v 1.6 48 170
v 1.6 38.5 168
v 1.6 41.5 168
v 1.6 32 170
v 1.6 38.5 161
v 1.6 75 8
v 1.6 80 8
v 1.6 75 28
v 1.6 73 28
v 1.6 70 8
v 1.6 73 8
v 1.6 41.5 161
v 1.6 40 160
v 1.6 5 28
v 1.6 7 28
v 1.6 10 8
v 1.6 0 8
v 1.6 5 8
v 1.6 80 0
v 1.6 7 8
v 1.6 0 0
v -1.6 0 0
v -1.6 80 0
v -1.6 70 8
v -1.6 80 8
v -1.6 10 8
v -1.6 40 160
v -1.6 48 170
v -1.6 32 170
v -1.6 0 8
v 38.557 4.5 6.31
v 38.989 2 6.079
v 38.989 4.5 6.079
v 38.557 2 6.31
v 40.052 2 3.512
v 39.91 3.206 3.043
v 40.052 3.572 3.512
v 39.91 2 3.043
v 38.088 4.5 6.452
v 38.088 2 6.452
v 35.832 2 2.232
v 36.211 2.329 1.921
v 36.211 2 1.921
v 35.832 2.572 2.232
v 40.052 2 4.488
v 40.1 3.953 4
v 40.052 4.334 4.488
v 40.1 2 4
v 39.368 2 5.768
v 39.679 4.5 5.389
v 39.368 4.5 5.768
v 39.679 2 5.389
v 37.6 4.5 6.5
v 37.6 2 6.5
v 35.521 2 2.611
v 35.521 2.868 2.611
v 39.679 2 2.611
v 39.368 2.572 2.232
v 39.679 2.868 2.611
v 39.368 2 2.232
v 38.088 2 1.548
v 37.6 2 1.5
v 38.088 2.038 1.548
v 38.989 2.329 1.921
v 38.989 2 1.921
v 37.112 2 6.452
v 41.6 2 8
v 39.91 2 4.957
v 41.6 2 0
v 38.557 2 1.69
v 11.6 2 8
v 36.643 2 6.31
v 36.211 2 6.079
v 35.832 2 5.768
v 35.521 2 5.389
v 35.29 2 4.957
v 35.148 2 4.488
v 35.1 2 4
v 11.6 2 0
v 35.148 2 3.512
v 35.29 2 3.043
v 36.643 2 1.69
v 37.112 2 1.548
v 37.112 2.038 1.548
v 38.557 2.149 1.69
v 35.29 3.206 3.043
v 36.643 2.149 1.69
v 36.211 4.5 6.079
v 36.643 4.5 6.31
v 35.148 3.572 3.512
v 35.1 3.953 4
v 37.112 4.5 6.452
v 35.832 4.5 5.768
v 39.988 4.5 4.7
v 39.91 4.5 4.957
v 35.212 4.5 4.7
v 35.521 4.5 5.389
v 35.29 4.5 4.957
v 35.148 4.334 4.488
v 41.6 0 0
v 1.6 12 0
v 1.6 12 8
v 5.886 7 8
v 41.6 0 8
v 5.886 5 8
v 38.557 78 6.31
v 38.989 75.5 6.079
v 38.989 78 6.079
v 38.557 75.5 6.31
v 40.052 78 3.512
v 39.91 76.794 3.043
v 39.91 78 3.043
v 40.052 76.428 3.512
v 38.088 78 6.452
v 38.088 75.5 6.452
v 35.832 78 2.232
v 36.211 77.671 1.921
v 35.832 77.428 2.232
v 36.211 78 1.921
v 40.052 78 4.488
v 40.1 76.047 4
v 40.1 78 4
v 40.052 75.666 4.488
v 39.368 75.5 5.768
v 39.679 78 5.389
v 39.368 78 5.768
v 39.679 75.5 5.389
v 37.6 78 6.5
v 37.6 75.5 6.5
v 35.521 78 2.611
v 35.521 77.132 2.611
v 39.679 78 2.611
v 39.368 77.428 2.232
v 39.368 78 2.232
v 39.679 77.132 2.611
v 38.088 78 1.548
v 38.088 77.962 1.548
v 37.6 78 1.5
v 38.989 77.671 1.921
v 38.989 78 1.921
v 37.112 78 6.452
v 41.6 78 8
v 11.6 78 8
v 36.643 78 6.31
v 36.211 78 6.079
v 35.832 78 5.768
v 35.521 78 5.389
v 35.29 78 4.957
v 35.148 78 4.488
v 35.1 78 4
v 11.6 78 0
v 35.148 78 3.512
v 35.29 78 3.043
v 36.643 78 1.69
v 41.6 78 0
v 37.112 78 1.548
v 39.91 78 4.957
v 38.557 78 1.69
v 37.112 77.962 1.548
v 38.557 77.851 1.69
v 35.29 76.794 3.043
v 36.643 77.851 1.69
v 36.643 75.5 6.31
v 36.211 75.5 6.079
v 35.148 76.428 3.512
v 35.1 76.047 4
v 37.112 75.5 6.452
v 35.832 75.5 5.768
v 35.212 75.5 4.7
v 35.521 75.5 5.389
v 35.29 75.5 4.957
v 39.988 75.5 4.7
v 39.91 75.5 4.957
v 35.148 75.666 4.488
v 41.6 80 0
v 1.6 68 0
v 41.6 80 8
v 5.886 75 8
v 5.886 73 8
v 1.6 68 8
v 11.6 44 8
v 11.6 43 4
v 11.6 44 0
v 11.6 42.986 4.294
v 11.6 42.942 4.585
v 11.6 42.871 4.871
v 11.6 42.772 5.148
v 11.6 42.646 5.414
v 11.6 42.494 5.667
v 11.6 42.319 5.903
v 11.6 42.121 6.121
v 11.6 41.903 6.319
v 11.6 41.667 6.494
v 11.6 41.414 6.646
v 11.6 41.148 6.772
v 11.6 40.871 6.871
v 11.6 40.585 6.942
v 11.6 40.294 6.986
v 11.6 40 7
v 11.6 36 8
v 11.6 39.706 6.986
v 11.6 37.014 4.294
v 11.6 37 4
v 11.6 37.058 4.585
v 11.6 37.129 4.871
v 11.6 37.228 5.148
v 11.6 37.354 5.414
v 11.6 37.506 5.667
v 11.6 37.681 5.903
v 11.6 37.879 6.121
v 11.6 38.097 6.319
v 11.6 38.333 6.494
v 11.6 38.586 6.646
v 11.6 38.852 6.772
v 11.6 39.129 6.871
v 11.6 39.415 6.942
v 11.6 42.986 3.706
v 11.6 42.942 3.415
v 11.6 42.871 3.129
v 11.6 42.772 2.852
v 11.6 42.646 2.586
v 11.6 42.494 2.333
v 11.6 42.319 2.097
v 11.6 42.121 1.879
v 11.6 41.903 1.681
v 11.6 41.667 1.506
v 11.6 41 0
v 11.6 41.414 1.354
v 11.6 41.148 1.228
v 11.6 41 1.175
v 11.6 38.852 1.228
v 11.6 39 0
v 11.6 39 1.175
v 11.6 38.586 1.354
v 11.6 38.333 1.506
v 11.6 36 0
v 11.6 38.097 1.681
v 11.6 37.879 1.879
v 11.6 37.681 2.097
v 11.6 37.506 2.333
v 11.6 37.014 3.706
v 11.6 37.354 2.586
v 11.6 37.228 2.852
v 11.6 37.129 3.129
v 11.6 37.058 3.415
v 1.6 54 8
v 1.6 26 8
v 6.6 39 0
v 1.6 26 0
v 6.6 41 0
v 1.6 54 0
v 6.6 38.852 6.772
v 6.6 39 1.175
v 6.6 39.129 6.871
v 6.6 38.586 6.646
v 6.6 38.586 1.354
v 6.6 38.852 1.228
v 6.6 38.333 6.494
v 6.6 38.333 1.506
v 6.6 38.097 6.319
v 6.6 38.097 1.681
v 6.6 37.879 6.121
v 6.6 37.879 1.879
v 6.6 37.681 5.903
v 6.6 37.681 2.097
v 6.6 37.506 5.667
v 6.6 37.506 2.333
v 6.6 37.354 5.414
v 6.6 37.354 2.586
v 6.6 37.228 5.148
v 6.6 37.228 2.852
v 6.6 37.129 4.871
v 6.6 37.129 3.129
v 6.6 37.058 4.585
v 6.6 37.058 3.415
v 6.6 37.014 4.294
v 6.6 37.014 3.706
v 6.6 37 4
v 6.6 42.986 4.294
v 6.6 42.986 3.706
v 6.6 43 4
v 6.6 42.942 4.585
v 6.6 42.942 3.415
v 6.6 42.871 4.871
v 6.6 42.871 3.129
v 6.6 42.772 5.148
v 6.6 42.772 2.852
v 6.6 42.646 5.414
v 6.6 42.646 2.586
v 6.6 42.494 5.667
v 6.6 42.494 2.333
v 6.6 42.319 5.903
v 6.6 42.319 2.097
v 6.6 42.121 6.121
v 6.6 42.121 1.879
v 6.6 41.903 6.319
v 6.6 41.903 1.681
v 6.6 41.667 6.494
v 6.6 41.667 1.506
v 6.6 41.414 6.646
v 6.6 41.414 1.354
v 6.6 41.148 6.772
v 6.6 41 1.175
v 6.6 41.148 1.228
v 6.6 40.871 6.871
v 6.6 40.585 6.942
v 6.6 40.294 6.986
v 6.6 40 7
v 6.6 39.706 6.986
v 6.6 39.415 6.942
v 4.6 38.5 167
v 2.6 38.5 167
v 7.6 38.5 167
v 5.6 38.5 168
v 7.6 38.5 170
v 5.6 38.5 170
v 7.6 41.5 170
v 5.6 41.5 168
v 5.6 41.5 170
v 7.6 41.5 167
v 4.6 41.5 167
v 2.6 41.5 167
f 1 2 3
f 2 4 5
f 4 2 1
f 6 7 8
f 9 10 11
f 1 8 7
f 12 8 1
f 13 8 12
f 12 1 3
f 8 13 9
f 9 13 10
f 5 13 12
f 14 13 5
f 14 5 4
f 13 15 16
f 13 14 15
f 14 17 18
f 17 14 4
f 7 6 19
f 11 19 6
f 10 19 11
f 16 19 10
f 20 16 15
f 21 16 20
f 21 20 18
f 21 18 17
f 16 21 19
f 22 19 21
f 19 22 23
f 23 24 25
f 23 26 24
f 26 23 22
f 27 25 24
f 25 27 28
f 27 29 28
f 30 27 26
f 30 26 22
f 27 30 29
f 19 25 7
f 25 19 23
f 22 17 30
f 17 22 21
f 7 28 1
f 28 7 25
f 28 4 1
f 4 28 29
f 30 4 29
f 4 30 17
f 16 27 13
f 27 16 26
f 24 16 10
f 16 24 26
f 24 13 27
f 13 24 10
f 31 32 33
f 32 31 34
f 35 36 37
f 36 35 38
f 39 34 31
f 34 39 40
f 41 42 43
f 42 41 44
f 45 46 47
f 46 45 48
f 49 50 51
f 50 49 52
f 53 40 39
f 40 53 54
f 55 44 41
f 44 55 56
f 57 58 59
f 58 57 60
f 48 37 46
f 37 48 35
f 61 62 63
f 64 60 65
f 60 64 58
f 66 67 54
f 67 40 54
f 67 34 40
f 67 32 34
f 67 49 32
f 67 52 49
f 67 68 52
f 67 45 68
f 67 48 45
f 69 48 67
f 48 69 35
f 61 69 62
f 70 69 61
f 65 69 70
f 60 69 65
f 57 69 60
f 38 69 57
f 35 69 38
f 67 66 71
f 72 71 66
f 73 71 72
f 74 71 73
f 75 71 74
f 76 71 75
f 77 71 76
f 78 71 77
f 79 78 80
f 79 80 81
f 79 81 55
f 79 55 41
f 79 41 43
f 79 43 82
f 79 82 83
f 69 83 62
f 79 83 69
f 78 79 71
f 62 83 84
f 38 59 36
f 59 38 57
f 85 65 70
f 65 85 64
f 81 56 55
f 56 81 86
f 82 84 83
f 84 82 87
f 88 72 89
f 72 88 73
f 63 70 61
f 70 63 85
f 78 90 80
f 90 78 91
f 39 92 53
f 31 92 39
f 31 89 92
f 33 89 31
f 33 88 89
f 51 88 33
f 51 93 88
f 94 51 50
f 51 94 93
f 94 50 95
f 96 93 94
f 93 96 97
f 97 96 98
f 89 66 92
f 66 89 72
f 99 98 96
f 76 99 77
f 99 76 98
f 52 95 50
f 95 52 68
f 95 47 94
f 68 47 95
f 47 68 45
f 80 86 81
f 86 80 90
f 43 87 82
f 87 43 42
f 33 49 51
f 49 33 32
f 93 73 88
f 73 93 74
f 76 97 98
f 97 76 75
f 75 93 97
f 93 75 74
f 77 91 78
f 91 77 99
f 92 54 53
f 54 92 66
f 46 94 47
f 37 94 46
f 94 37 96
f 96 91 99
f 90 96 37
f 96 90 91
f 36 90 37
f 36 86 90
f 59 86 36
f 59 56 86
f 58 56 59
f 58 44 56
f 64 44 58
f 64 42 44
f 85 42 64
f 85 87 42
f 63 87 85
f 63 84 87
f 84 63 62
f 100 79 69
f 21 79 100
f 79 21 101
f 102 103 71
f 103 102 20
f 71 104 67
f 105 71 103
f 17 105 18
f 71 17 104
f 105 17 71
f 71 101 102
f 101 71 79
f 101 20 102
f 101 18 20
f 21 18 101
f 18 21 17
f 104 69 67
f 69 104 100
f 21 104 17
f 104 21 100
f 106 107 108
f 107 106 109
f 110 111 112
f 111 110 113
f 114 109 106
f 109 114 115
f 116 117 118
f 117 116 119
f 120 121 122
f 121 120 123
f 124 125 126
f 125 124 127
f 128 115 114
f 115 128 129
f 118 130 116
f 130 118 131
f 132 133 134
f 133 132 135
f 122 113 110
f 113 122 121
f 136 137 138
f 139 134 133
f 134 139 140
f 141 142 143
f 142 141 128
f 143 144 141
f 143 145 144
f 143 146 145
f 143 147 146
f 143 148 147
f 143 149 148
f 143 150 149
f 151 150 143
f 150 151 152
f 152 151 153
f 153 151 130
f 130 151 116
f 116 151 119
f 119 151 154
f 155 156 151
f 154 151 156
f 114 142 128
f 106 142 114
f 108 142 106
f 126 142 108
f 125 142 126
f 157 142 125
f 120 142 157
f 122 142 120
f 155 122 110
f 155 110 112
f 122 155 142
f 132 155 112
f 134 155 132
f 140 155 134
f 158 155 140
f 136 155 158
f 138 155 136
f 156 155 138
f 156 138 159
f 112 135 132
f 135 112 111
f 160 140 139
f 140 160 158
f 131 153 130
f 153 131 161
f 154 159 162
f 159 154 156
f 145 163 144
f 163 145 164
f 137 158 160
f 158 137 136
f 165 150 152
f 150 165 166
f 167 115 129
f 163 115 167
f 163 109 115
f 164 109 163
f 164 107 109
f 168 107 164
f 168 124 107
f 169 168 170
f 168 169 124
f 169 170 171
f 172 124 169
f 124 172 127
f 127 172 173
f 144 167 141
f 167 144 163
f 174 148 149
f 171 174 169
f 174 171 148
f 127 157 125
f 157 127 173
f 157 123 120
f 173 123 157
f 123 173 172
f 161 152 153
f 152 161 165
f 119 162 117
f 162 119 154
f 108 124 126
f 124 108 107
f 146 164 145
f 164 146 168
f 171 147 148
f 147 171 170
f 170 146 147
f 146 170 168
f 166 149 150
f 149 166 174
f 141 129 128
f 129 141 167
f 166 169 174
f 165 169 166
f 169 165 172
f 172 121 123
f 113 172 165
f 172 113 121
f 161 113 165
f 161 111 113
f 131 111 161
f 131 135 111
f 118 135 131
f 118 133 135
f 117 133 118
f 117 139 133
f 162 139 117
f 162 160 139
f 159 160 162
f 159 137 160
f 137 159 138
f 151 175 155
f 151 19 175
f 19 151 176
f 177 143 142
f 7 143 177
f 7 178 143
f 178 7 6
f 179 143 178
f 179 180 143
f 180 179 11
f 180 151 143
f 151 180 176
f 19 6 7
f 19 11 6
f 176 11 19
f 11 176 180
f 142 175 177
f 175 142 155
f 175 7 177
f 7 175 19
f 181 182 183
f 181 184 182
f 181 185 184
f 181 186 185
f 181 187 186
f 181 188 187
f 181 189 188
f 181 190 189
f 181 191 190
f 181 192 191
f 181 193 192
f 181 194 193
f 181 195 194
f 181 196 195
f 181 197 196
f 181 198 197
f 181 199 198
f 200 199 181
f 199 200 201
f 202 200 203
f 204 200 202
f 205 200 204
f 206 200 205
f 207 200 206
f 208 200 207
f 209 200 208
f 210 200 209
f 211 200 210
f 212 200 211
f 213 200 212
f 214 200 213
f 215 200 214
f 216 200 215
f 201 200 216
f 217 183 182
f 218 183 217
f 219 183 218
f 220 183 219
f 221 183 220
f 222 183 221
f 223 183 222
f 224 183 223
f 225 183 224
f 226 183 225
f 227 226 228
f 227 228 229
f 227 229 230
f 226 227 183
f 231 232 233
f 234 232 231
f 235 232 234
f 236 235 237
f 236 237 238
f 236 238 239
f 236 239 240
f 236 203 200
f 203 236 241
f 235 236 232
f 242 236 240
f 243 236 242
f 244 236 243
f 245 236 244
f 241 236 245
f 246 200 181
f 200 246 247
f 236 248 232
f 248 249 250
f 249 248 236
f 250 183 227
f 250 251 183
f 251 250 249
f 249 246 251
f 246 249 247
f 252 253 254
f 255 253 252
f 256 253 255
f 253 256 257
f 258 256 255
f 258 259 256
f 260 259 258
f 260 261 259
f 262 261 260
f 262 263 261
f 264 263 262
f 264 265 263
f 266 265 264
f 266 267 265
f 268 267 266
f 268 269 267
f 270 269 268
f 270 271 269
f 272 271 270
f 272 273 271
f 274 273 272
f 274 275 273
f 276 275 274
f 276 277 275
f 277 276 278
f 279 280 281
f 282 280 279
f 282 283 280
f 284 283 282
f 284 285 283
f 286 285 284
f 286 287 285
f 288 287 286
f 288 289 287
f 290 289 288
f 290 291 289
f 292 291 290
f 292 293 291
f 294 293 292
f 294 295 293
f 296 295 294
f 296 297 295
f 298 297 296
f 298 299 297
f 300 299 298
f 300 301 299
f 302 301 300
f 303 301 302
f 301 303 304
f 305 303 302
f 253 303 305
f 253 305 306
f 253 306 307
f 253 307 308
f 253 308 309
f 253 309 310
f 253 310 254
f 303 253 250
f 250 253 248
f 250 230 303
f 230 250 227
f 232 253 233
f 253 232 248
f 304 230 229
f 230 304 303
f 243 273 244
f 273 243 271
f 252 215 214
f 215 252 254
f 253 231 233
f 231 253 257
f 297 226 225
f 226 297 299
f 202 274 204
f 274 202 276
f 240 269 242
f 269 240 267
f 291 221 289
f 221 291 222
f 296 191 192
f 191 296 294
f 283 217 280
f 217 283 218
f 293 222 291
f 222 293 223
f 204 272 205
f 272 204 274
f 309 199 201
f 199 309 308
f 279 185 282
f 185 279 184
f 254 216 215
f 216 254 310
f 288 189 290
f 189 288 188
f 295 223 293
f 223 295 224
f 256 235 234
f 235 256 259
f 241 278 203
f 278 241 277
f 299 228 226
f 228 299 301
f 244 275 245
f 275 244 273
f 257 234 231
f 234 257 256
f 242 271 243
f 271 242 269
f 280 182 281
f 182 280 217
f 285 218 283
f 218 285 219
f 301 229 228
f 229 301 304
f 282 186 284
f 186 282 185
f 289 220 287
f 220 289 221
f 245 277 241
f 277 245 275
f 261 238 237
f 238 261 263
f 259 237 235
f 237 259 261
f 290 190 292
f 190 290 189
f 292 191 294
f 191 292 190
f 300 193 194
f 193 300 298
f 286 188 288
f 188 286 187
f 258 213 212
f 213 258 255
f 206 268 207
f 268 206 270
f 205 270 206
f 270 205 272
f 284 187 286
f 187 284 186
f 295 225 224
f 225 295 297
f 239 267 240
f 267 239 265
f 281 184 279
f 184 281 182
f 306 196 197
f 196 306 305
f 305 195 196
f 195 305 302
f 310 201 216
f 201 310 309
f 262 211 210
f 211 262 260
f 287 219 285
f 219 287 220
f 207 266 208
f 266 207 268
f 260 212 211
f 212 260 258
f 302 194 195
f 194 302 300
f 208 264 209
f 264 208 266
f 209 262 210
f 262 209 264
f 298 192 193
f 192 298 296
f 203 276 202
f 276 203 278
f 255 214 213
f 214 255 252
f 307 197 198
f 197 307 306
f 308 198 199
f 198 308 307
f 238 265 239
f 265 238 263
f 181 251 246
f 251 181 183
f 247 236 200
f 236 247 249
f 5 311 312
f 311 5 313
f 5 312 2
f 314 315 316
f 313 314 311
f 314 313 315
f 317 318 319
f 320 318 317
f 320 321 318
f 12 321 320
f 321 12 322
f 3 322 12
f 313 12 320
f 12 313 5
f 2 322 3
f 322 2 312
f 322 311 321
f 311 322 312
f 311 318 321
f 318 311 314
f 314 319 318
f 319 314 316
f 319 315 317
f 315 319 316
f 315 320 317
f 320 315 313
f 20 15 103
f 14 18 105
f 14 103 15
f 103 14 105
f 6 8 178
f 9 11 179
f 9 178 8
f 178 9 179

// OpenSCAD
// file: ffp2_drying_rack.scad
/*

  ffp2_drying_rack.scad

  (c) olikraus@gmail.com

  This work is licensed under the Creative Commons Attribution-NonCommercial-ShareAlike 4.0 International License. 
  To view a copy of this license, visit http://creativecommons.org/licenses/by-nc-sa/4.0/.
    
*/


$fn=32;

wall_thickness=3.2;
wall_height=170;
wall_width=80;


clip_len=40;
clip_height=8;
clip_thickness=2;
clip_diameter = clip_height-3;
clip_cylinder_len = 2.5;

/* min 8 for clip_cyllinder_len=2.5 
    also depends on clip_diameter and in turn on clip_height
    clip_triangle_len must be also larger than press_fit_len
*/
clip_triangle_len = 10;

/* clip hole diameter extention, so that the clip fits better */
clip_diameter_gap = 0.1; 


hook_len=6;
hook_nose_height=3;
hook_nose_width=2;
hook_thickness=3;

press_fit_len=5;
press_fit_diameter=clip_height-2;


module triangle_block() {
    linear_extrude(height=clip_height)
    polygon(points=[[0,0],[clip_triangle_len,0],[0,clip_triangle_len]]);
}

module wall_support() {
  translate([0,clip_thickness,0])
  rotate([90,0,0])
  linear_extrude(height=clip_thickness)
  polygon(points=[[0,0],[clip_triangle_len*3/7,0],[0,clip_triangle_len*2]]);
}

module clip_m() {
    union() {
        translate([0,clip_thickness,0])
        triangle_block();
        cube([clip_len, clip_thickness,clip_height]);
        translate([clip_len-(clip_height)/2,clip_thickness,clip_height/2])
        rotate([-90,0,0])
        difference() {
            cylinder(d=clip_diameter, h=clip_cylinder_len);
            translate([0,(clip_diameter)/2,0])
            rotate([-38,0,0])
            translate([-clip_height/2, -clip_height, 0])
            cube([clip_height,clip_height,clip_height]);
        }
    }
}


module clip_f() {
    translate([0,clip_thickness,0])
    difference() {
        rotate([0,0,90])
        triangle_block();
        translate([-clip_height/2,-0.01,clip_height/2])
        rotate([-90,0,0])
        cylinder(d=clip_diameter+clip_diameter_gap, 
                h=clip_cylinder_len+0.5);
    }
}

module hook() {
    rotate([-90,0,0])
    linear_extrude(height=hook_thickness, center=true)
    polygon(points=[
        [0,-1],
        [1,0],
        [hook_len-hook_nose_width-1,0],
        [hook_len-hook_nose_width,-1],
        [hook_len-hook_nose_width,-hook_nose_height],
        [hook_len,-hook_nose_height],
        [hook_len,0],
        [0,hook_len]]);
}

module press_fit_f() {
    difference() {
        translate([0,-clip_height/2,0])
        cube([clip_triangle_len, clip_height, clip_height]);
        
        translate([clip_triangle_len-press_fit_len,
            -press_fit_diameter/3/2,
            -0.01])
        cube([press_fit_len+0.01,press_fit_diameter/3,clip_height/2]);
        

        translate([clip_triangle_len-press_fit_len,0,clip_height/2])
        rotate([0,90,0])
        cylinder(d=press_fit_diameter,h=press_fit_len+0.01, $fn=64);
    }

    translate([0,clip_height/2,0])
    triangle_block();

    mirror([0,1,0])
    translate([0,clip_height/2,0])
    triangle_block();
}

module press_fit_m() {

    translate([-clip_len+clip_triangle_len,0,0])
    union() {
        translate([0.5-press_fit_len,-(press_fit_diameter/3-0.2)/2,0])
        cube([press_fit_len-0.5,press_fit_diameter/3-0.2,clip_height/2]);
        
        translate([0,0,clip_height/2])
        rotate([0,-90,0])
        cylinder(
            d1=press_fit_diameter, 
            d2=press_fit_diameter*0.95, 
            h=press_fit_len-0.5, $fn=6);
        
        translate([0,-clip_height/2,0])
        cube([clip_len-clip_triangle_len, clip_height, clip_height]);
        
        translate([clip_len-clip_triangle_len,clip_height/2,0])
        mirror([1,0,0])
        triangle_block();

        translate([clip_len-clip_triangle_len,-clip_height/2,0])
        rotate([0,0,180])
        triangle_block();
        
    }
}

module pure_wall() {
    difference() {
        union() {
            translate([-wall_thickness/2,0,0])
            cube([wall_thickness, wall_width, clip_height]);

            translate([wall_thickness/2,0,clip_height])
            rotate([0,-90,0])
            linear_extrude(height=wall_thickness)
            polygon(points=[
                [0,0],
                [0,wall_width],
                [wall_height-clip_height,wall_width/2+clip_height],
                [wall_height-clip_height,wall_width/2-clip_height]
            ]);


            
        }

        translate([wall_thickness,0,clip_height])
        rotate([0,-90,0])
        linear_extrude(height=wall_thickness*2)
        polygon(points=[
        [0,clip_triangle_len],
        [0,wall_width-clip_triangle_len],
        [wall_height-clip_height-clip_triangle_len,wall_width/2]
        ]);
    }
    
}


module wall(is_left=1, is_right=1) {
    union() {
        //translate([-wall_thickness/2,0,0])
        //cube([wall_thickness, wall_width, wall_height]);
        pure_wall();
        if ( is_right) {
            translate([wall_thickness/2,0,0])
            clip_m();

            translate([wall_thickness/2,wall_width,0])
            mirror([0,1,0])
            clip_m();

            translate([wall_thickness/2,wall_width/2,0])
            press_fit_f();
            
            translate([wall_thickness/2,
                    wall_width/2,
                    wall_height-hook_nose_height])            
            hook();
	    
            translate([wall_thickness/2,clip_thickness*2.5,clip_height])
	    wall_support();

            translate([wall_thickness/2,wall_width-clip_thickness*3.5,clip_height])
	    wall_support();

        }

        if ( is_left) {

            translate([-wall_thickness/2,0,0])
            clip_f();

            translate([-wall_thickness/2,wall_width,0])
            mirror([0,1,0])
            clip_f();
            
            translate([-wall_thickness/2,wall_width/2,0])
            press_fit_m();
            
            mirror([1,0,0])
            translate([wall_thickness/2,
                    wall_width/2,
                    wall_height-hook_nose_height])
            hook();

            mirror([1,0,0])
            translate([wall_thickness/2,clip_thickness*2.5,clip_height])
	    wall_support();

            mirror([1,0,0])
            translate([wall_thickness/2,wall_width-clip_thickness*3.5,clip_height])
	    wall_support();

        }
    }
}


//wall(1,1);
// main file
/*

  right.scad

  (c) olikraus@gmail.com

  This work is licensed under the Creative Commons Attribution-NonCommercial-ShareAlike 4.0 International License. 
  To view a copy of this license, visit http://creativecommons.org/licenses/by-nc-sa/4.0/.
    
*/
include <ffp2_drying_rack.scad>

wall(0,1);
